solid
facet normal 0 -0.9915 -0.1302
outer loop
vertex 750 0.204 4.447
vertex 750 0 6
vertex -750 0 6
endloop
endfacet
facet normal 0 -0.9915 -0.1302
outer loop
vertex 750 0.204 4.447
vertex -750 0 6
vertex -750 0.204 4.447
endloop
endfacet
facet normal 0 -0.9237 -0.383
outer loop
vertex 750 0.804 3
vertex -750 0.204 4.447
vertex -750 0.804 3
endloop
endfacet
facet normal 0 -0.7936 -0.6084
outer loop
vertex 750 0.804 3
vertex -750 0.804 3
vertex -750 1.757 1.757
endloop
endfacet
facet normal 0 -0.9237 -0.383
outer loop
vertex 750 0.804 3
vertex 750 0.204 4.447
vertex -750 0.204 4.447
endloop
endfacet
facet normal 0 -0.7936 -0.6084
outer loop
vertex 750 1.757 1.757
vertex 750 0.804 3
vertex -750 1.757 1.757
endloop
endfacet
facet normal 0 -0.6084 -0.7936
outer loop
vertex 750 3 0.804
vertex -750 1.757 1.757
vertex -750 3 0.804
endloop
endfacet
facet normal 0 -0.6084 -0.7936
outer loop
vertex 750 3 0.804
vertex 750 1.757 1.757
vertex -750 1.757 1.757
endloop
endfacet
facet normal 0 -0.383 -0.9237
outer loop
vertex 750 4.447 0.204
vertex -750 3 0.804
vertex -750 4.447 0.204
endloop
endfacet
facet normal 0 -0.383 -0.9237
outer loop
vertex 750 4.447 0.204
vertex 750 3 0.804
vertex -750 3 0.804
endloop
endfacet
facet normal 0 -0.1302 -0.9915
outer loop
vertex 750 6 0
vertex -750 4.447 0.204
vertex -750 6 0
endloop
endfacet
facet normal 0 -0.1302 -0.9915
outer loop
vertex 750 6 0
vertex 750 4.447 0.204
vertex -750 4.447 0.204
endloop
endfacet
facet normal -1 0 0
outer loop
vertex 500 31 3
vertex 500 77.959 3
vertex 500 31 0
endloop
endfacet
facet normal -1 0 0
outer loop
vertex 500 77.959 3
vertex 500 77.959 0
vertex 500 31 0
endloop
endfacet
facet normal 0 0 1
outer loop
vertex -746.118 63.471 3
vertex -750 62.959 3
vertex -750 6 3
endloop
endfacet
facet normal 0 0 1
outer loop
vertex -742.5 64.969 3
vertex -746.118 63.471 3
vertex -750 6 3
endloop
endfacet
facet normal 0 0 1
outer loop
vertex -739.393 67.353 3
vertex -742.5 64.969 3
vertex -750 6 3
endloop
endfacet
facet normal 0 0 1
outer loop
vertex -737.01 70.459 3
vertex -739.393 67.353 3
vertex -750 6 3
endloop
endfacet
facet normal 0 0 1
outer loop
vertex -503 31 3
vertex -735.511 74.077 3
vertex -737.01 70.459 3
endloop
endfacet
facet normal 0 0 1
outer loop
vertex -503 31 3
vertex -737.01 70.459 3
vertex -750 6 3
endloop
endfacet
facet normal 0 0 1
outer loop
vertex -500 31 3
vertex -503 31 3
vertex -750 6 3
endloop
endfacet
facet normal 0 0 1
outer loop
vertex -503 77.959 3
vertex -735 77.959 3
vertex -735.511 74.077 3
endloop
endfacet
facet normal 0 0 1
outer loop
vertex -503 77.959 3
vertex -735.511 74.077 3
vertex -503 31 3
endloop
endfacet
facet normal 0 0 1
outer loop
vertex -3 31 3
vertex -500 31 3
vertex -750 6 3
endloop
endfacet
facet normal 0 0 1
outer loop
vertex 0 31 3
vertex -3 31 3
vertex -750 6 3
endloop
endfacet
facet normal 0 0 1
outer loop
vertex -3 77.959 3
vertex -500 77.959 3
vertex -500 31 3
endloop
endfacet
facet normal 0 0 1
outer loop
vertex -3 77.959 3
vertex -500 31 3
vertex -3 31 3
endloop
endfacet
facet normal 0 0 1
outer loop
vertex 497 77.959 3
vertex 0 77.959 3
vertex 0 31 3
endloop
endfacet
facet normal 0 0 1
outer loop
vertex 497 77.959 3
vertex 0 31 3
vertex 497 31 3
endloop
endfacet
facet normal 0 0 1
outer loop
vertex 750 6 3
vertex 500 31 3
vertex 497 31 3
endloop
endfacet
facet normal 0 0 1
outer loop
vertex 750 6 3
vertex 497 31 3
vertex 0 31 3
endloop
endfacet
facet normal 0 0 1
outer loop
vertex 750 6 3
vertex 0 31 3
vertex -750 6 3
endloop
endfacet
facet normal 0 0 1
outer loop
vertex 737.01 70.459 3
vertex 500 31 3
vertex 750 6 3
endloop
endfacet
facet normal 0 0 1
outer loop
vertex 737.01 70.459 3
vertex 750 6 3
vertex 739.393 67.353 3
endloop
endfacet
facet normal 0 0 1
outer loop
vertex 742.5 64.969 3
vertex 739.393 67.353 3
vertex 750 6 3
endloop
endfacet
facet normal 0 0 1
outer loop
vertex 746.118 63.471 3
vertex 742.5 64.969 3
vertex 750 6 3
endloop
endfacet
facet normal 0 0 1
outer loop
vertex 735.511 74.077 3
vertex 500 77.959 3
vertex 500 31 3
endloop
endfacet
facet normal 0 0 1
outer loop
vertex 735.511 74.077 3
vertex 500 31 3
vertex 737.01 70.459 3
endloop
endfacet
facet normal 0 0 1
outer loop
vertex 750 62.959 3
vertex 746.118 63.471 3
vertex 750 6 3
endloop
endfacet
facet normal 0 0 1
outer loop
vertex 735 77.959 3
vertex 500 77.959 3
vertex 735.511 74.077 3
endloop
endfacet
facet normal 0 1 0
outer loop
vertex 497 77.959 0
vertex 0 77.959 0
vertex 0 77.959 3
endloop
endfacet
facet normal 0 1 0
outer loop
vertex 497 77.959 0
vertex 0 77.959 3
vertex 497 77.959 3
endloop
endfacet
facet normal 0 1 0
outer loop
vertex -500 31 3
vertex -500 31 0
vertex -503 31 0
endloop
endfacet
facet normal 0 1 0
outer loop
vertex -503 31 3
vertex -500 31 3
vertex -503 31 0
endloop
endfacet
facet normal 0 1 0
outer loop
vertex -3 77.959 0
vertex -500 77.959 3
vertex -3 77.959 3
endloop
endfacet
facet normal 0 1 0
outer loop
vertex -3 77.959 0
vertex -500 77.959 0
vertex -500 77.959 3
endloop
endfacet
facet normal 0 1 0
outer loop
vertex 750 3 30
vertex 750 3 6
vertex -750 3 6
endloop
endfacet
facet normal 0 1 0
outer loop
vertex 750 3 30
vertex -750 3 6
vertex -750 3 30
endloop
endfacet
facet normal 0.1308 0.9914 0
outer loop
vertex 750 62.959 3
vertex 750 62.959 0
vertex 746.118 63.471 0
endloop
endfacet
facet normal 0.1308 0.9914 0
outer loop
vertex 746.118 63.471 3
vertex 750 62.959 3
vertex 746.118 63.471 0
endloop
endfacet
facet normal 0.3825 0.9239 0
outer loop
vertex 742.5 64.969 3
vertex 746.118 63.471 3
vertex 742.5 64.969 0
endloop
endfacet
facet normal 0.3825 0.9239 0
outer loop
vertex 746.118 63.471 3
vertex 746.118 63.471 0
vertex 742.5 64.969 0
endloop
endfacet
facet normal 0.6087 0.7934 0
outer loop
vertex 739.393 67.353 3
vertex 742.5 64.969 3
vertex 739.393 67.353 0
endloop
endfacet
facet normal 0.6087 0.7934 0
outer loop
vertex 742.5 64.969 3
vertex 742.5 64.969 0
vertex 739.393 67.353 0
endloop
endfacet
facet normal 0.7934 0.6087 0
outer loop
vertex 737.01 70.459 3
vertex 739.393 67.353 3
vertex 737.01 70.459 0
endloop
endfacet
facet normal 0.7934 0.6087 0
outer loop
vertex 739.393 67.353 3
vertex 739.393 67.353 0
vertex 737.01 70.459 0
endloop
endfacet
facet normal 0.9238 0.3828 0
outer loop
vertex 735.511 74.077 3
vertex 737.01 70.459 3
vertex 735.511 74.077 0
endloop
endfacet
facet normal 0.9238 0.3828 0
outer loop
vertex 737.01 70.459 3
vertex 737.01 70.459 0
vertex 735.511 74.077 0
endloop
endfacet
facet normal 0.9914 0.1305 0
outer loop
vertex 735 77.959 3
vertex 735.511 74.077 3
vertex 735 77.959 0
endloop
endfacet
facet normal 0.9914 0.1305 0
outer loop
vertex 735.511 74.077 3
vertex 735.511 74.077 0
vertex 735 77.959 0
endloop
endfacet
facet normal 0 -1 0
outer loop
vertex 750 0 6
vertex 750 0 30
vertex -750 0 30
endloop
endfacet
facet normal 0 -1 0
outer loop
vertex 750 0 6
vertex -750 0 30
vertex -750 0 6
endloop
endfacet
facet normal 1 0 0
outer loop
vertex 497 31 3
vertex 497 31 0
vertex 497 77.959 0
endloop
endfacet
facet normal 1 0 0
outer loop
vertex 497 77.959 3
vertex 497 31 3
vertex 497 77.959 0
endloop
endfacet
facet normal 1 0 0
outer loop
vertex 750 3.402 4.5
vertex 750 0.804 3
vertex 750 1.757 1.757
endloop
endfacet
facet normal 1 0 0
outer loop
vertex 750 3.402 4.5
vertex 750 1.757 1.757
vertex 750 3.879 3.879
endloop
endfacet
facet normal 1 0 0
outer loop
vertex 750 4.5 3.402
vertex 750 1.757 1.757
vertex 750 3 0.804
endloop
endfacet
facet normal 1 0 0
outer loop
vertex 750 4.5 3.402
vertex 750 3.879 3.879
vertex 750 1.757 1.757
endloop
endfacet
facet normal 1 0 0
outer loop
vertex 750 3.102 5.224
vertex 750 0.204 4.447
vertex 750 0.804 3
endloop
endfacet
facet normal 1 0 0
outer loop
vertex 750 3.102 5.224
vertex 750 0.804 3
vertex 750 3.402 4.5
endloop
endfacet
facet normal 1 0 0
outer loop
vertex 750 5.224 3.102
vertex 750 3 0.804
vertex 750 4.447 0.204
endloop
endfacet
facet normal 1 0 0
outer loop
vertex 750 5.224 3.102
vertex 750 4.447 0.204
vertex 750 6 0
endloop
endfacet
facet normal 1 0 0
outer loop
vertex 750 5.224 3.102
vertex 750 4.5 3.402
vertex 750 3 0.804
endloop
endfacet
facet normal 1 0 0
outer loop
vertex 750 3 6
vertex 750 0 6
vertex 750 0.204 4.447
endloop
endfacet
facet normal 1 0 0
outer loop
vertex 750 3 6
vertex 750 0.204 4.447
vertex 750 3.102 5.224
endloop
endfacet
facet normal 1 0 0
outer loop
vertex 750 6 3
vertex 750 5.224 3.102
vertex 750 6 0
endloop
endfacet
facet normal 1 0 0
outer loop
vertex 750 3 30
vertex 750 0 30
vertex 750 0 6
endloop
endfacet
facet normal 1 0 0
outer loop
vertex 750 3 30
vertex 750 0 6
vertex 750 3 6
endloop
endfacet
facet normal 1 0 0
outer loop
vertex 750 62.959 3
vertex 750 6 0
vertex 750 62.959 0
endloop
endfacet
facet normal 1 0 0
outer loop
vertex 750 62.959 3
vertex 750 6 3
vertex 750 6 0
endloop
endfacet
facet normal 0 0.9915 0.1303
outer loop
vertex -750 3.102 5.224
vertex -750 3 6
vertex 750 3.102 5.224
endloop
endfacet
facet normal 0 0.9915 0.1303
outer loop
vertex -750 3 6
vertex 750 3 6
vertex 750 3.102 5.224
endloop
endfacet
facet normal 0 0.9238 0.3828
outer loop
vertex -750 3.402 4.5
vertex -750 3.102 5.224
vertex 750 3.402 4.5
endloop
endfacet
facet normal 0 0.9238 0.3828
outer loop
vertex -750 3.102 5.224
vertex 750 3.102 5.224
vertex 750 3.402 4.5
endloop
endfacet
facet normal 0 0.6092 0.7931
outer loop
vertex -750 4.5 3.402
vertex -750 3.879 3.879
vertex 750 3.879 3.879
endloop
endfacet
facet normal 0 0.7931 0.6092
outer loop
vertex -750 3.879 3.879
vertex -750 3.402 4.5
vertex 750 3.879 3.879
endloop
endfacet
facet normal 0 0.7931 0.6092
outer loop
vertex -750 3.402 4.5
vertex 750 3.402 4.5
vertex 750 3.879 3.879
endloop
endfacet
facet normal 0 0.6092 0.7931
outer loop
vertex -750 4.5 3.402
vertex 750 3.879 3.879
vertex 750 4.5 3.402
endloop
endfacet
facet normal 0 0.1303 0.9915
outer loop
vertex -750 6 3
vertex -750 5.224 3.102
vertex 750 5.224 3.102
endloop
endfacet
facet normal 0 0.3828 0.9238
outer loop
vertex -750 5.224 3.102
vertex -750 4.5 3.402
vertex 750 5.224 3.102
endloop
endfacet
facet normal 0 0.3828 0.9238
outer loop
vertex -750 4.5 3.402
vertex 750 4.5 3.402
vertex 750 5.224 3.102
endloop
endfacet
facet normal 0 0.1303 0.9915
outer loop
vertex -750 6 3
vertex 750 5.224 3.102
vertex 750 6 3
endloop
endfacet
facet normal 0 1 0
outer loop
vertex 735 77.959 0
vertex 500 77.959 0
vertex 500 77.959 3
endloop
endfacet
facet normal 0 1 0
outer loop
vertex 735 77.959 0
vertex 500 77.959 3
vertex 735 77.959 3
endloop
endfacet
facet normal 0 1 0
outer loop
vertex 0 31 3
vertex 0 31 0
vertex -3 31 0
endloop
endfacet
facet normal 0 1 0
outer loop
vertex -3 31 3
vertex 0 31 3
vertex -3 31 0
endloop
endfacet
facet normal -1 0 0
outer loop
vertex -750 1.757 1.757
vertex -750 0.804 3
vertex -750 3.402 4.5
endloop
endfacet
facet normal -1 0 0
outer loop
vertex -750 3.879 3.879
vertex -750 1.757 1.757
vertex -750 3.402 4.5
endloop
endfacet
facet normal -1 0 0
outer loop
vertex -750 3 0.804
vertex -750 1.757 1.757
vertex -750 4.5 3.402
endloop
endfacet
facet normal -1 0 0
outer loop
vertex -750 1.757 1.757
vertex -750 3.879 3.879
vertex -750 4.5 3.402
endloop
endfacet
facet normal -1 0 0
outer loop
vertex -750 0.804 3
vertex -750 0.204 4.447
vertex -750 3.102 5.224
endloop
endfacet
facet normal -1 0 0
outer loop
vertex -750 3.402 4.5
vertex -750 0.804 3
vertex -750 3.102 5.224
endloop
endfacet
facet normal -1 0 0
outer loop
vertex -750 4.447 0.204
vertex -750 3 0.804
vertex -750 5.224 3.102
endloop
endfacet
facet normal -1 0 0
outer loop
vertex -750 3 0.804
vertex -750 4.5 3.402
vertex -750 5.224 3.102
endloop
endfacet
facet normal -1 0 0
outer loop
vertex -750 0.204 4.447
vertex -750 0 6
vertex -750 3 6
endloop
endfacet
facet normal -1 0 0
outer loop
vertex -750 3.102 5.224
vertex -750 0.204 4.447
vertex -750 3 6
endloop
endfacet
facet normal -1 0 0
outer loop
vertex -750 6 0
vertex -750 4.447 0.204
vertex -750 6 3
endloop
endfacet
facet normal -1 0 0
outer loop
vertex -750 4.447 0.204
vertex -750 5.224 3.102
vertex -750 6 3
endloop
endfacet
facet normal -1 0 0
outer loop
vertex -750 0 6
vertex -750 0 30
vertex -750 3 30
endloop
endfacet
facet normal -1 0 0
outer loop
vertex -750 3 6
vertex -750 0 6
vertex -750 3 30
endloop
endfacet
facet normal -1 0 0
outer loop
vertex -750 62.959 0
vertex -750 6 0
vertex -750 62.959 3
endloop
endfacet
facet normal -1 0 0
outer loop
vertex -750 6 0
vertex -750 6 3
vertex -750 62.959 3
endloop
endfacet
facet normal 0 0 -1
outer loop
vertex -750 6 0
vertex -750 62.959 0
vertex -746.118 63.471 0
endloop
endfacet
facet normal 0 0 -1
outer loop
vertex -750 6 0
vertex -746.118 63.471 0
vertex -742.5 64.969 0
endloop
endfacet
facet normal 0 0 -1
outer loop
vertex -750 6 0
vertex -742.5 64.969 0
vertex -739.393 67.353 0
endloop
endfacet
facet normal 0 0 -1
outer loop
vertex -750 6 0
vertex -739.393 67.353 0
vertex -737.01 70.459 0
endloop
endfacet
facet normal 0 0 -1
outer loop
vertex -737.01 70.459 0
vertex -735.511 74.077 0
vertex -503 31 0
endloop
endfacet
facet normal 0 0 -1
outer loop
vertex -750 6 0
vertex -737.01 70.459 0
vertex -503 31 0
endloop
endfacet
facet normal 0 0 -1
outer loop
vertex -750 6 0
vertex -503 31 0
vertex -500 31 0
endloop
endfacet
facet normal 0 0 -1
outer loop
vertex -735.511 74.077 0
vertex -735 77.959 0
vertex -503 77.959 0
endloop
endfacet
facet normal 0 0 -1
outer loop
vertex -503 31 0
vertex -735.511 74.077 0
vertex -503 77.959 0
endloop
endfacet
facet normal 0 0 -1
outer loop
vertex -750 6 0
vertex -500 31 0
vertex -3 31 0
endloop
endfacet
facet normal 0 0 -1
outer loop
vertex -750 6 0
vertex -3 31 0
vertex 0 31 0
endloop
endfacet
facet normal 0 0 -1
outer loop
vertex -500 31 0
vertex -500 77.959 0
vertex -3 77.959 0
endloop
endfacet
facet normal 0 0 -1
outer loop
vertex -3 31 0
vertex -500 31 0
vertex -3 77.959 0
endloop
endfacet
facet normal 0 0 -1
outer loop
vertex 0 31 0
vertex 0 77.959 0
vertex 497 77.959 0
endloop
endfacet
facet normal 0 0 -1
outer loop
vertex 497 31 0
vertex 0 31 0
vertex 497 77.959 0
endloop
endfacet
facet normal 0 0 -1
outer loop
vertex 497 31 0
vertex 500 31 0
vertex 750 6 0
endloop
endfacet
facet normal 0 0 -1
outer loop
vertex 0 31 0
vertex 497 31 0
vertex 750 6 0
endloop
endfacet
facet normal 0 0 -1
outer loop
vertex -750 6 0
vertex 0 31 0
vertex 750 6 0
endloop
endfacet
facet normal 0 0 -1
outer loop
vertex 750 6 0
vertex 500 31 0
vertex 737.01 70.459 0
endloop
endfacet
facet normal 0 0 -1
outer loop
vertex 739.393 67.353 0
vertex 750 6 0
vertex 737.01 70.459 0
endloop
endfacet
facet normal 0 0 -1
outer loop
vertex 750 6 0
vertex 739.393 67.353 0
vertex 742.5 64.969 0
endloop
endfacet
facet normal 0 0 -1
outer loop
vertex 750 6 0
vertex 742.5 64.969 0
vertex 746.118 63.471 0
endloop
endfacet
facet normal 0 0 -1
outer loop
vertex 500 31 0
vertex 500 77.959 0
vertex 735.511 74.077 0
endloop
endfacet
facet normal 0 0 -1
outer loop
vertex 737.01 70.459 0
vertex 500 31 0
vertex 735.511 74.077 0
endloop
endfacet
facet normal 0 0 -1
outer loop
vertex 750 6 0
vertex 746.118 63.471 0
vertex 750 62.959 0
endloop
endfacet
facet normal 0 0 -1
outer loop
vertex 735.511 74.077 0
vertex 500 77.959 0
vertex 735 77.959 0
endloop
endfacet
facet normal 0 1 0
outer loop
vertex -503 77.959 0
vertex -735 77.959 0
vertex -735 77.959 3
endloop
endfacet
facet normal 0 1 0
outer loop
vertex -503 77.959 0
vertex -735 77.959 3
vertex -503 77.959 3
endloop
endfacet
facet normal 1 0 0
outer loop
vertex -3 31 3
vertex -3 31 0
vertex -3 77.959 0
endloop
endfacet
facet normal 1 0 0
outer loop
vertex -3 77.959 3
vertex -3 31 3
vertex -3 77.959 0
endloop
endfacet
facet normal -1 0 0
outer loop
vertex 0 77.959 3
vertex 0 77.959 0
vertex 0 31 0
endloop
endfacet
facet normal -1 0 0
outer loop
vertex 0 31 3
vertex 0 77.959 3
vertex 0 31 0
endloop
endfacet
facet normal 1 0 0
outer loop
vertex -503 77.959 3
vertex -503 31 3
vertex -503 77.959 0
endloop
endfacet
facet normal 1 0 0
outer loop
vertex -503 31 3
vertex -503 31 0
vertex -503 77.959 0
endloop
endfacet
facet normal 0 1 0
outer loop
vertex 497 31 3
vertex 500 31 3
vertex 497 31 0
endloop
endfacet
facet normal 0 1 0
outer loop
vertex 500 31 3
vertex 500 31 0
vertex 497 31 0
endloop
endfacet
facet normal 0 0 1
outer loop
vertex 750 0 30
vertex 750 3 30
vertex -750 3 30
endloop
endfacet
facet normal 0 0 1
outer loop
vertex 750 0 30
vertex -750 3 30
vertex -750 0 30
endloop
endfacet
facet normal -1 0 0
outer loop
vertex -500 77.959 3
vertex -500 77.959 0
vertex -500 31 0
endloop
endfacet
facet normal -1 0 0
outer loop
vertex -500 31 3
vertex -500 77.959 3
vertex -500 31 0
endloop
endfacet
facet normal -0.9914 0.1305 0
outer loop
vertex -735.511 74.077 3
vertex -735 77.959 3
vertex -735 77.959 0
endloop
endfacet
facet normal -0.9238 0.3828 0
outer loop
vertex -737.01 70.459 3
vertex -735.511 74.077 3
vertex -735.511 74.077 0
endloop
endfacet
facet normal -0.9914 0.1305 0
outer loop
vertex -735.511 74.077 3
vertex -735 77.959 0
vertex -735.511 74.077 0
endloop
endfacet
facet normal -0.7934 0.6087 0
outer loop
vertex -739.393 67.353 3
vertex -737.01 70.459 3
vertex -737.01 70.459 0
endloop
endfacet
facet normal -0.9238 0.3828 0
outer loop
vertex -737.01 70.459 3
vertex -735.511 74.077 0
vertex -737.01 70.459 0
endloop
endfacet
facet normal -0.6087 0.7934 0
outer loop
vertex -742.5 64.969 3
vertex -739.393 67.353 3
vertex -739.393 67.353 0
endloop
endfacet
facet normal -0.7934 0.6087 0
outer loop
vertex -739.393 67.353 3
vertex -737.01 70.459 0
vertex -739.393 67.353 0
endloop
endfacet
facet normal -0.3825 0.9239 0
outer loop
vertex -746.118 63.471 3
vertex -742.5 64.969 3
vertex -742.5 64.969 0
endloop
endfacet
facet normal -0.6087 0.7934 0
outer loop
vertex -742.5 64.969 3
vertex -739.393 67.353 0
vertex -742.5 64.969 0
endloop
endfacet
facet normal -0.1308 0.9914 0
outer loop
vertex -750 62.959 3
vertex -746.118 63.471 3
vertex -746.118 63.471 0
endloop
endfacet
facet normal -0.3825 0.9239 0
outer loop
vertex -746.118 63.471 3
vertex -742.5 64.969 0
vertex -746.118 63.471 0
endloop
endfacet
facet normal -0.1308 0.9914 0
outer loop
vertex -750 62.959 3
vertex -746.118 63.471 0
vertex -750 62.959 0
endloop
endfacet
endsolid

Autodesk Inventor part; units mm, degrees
ref_plane "YZ Plane" through (0, 0, 0) normal (1, 0, 0) x (0, 1, 0)
ref_plane "XZ Plane" through (0, 0, 0) normal (0, 1, 0) x (-1, 0, 0)
ref_plane "XY Plane" through (0, 0, 0) normal (0, 0, 1) x (1, 0, 0)
sketch "Sketch1" plane through (0, 0, 0) normal (0, 0, 1) x (1, 0, 0)
  line L0 (-750, 77.9594) -> (750, 77.9594)
  line L1 (750, 77.9594) -> (750, 0)
  line L2 (750, 0) -> (-750, 0)
  line L3 (-750, 0) -> (-750, 77.9594)
  point P0 (0, 0)
  point P1 (0, 0)
  dimension "d0" = 1500
  dimension "d1" = 77.9594
extrude "Plate1" add sketch "Sketch1" along normal blind 3
sketch "Sketch2" plane through (750, 3, 0) normal (0, -1, 0) x (1, 0, 0)
  line L0 (-1500, 0) -> (0, 0)
  line L1 (0, 0) -> (0, 30)
  line L2 (0, 30) -> (-1500, 30)
  line L3 (-1500, 30) -> (-1500, 0)
edge flange "Flange1" height 30 angle 90 thickness 3 bend radius 3 thickness toward (0, -1, 0) relief tear relief width 3 relief depth 1.5 edges at (0, 0, 3) wall of the first edge with corners at (-750, 3, 0) (750, 3, 0) (750, 3, 30) (-750, 3, 30)
bend "Bend1"
corner "Corner1"
sketch "Sketch5" plane through (0, 0, 0) normal (0, 0, -1) x (-1, 0, 0)
  line L0 (750, 77.9594) -> (-750, 77.9594) projected
  line L1 (500, 77.9594) -> (500, 31)
  line L2 (500, 31) -> (503, 31)
  line L3 (503, 31) -> (503, 77.9594)
  line L4 (750, 0) -> (-750, 0) projected
  point P0 (0, 0)
  dimension "d18" = 3
  dimension "d19" = 247
  dimension "d20" = 31
extrude "Extrusion1" cut sketch "Sketch5" against normal through all
pattern_linear "Rectangular Pattern1" count 3 spacing 500 along (1, 0, 0) of "Extrusion1"
sketch "Sketch6" plane through (0, 0, 0) normal (0, 0, -1) x (-1, 0, 0)
  line L0 (-750, 77.9594) -> (-750, 6) projected
  circle A0 centre (-750, 77.9594) radius 15
  line L1 (-750, 77.9594) -> (-500, 77.9594) projected
  point P0 (0, 0)
  point P1 (-735, 77.9594)
  point P2 (-750, 62.9594)
  dimension "d24" = 30
extrude "Extrusion2" cut sketch "Sketch6" against normal through all contours L1 A0 L0 picked at (-740.1254, 76.8468)
mirror "Mirror1" about plane through (0, 0, 0) normal (1, 0, 0) of "Extrusion2"
equation "\"d1\" = Стрингер_6"
equation "\"d18\" = Thickness"
equation "\"d2\" = Thickness"
equation "\"d3\" = BendReliefWidth"
equation "\"d4\" = BendReliefDepth"
equation "\"d5\" = MinimumRemnant"
equation "\"d6\" = TransitionRadius"
equation "\"d9\" = BendRadius"
equation "\"d10\" = CornerReliefSize"
equation "\"d11\" = GapSize"
equation "\"d12\" = JacobiRadiusSize"
equation "\"BendRadius\" = Thickness"
equation "\"BendReliefWidth\" = Thickness"
equation "\"BendReliefDepth\" = 0.5 * Thickness"
equation "\"CornerReliefSize\" = 4 * Thickness"
equation "\"MinimumRemnant\" = 2 * Thickness"
equation "\"TransitionRadius\" = BendRadius"
equation "\"JacobiRadiusSize\" = BendRadius"
equation "\"GapSize\" = Thickness"
equation "\"Стрингер_6\" = 77.959354"
equation "\"Thickness\" = 3"
properties part number "МОО 056 стрингер борт 6"
